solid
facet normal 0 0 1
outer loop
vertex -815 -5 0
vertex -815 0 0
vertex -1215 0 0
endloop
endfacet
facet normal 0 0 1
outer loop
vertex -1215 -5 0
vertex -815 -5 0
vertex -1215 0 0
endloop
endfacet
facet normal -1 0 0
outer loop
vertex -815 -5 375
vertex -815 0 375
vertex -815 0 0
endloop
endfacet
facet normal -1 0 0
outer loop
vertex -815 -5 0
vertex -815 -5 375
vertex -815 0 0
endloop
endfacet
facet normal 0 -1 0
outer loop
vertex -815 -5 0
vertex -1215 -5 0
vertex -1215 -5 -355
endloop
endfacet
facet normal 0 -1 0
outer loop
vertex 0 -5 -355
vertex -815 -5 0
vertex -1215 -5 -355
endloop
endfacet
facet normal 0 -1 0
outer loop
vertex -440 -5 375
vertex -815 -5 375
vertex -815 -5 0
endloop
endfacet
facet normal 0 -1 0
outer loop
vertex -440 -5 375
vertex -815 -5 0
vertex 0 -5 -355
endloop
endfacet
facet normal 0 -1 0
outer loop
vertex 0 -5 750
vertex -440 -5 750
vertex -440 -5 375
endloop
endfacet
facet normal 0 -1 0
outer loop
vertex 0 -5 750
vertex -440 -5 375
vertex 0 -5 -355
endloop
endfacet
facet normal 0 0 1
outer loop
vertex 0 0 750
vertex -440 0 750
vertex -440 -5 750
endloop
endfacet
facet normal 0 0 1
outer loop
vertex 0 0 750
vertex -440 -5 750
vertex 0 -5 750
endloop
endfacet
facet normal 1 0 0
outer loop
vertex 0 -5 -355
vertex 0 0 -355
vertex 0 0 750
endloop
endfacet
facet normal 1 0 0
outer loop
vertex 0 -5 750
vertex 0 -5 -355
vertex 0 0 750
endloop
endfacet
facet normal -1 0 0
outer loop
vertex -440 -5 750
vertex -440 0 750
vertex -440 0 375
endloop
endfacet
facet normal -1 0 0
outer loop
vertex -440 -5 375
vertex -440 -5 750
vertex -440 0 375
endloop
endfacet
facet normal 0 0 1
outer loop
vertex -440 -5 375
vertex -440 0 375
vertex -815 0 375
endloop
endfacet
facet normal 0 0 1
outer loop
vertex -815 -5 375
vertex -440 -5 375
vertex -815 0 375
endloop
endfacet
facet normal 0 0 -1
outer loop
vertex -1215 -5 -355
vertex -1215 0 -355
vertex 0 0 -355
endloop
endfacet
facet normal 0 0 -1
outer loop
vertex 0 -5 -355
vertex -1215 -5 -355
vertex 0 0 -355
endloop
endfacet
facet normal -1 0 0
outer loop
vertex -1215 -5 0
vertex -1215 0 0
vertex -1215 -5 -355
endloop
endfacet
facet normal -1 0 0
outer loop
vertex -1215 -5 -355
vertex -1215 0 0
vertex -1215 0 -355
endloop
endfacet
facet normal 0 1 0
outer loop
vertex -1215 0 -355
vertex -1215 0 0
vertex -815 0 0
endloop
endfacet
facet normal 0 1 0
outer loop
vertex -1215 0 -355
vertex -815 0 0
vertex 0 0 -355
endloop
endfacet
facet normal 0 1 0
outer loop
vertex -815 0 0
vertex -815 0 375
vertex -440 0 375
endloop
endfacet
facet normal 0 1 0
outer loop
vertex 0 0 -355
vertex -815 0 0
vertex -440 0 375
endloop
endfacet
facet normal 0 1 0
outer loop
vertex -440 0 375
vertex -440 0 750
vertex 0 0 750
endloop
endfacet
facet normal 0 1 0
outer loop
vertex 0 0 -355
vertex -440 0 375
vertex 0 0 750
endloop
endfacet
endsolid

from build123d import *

# Parameters (mm, degrees)
F0_W     = 375
F0_H     = 355
F0_W_2   = 440
F0_H_2   = 20
F1_DEPTH = 5


with BuildPart() as f1:
    # F0 (on Front) → F1 (new body)
    with BuildSketch(Plane.XZ):
        Polygon((-815, 0), (-1215, 0), (-1215, -355), (0, -355), (0, 0), (-440, 0), align=None)
        with Locations((-627.5, 197.5)):
            Rectangle(F0_W, F0_H)
        with Locations((-220, 197.5)):
            Rectangle(F0_W_2, F0_H)
        with Locations((-220, 572.5)):
            Rectangle(F0_W_2, F0_H)
        with Locations((-220, 385)):
            Rectangle(F0_W_2, F0_H_2)
        with Locations((-220, 10)):
            Rectangle(F0_W_2, F0_H_2)
        with Locations((-627.5, 10)):
            Rectangle(F0_W, F0_H_2)
    extrude(amount=F1_DEPTH)


solid = f1.part
